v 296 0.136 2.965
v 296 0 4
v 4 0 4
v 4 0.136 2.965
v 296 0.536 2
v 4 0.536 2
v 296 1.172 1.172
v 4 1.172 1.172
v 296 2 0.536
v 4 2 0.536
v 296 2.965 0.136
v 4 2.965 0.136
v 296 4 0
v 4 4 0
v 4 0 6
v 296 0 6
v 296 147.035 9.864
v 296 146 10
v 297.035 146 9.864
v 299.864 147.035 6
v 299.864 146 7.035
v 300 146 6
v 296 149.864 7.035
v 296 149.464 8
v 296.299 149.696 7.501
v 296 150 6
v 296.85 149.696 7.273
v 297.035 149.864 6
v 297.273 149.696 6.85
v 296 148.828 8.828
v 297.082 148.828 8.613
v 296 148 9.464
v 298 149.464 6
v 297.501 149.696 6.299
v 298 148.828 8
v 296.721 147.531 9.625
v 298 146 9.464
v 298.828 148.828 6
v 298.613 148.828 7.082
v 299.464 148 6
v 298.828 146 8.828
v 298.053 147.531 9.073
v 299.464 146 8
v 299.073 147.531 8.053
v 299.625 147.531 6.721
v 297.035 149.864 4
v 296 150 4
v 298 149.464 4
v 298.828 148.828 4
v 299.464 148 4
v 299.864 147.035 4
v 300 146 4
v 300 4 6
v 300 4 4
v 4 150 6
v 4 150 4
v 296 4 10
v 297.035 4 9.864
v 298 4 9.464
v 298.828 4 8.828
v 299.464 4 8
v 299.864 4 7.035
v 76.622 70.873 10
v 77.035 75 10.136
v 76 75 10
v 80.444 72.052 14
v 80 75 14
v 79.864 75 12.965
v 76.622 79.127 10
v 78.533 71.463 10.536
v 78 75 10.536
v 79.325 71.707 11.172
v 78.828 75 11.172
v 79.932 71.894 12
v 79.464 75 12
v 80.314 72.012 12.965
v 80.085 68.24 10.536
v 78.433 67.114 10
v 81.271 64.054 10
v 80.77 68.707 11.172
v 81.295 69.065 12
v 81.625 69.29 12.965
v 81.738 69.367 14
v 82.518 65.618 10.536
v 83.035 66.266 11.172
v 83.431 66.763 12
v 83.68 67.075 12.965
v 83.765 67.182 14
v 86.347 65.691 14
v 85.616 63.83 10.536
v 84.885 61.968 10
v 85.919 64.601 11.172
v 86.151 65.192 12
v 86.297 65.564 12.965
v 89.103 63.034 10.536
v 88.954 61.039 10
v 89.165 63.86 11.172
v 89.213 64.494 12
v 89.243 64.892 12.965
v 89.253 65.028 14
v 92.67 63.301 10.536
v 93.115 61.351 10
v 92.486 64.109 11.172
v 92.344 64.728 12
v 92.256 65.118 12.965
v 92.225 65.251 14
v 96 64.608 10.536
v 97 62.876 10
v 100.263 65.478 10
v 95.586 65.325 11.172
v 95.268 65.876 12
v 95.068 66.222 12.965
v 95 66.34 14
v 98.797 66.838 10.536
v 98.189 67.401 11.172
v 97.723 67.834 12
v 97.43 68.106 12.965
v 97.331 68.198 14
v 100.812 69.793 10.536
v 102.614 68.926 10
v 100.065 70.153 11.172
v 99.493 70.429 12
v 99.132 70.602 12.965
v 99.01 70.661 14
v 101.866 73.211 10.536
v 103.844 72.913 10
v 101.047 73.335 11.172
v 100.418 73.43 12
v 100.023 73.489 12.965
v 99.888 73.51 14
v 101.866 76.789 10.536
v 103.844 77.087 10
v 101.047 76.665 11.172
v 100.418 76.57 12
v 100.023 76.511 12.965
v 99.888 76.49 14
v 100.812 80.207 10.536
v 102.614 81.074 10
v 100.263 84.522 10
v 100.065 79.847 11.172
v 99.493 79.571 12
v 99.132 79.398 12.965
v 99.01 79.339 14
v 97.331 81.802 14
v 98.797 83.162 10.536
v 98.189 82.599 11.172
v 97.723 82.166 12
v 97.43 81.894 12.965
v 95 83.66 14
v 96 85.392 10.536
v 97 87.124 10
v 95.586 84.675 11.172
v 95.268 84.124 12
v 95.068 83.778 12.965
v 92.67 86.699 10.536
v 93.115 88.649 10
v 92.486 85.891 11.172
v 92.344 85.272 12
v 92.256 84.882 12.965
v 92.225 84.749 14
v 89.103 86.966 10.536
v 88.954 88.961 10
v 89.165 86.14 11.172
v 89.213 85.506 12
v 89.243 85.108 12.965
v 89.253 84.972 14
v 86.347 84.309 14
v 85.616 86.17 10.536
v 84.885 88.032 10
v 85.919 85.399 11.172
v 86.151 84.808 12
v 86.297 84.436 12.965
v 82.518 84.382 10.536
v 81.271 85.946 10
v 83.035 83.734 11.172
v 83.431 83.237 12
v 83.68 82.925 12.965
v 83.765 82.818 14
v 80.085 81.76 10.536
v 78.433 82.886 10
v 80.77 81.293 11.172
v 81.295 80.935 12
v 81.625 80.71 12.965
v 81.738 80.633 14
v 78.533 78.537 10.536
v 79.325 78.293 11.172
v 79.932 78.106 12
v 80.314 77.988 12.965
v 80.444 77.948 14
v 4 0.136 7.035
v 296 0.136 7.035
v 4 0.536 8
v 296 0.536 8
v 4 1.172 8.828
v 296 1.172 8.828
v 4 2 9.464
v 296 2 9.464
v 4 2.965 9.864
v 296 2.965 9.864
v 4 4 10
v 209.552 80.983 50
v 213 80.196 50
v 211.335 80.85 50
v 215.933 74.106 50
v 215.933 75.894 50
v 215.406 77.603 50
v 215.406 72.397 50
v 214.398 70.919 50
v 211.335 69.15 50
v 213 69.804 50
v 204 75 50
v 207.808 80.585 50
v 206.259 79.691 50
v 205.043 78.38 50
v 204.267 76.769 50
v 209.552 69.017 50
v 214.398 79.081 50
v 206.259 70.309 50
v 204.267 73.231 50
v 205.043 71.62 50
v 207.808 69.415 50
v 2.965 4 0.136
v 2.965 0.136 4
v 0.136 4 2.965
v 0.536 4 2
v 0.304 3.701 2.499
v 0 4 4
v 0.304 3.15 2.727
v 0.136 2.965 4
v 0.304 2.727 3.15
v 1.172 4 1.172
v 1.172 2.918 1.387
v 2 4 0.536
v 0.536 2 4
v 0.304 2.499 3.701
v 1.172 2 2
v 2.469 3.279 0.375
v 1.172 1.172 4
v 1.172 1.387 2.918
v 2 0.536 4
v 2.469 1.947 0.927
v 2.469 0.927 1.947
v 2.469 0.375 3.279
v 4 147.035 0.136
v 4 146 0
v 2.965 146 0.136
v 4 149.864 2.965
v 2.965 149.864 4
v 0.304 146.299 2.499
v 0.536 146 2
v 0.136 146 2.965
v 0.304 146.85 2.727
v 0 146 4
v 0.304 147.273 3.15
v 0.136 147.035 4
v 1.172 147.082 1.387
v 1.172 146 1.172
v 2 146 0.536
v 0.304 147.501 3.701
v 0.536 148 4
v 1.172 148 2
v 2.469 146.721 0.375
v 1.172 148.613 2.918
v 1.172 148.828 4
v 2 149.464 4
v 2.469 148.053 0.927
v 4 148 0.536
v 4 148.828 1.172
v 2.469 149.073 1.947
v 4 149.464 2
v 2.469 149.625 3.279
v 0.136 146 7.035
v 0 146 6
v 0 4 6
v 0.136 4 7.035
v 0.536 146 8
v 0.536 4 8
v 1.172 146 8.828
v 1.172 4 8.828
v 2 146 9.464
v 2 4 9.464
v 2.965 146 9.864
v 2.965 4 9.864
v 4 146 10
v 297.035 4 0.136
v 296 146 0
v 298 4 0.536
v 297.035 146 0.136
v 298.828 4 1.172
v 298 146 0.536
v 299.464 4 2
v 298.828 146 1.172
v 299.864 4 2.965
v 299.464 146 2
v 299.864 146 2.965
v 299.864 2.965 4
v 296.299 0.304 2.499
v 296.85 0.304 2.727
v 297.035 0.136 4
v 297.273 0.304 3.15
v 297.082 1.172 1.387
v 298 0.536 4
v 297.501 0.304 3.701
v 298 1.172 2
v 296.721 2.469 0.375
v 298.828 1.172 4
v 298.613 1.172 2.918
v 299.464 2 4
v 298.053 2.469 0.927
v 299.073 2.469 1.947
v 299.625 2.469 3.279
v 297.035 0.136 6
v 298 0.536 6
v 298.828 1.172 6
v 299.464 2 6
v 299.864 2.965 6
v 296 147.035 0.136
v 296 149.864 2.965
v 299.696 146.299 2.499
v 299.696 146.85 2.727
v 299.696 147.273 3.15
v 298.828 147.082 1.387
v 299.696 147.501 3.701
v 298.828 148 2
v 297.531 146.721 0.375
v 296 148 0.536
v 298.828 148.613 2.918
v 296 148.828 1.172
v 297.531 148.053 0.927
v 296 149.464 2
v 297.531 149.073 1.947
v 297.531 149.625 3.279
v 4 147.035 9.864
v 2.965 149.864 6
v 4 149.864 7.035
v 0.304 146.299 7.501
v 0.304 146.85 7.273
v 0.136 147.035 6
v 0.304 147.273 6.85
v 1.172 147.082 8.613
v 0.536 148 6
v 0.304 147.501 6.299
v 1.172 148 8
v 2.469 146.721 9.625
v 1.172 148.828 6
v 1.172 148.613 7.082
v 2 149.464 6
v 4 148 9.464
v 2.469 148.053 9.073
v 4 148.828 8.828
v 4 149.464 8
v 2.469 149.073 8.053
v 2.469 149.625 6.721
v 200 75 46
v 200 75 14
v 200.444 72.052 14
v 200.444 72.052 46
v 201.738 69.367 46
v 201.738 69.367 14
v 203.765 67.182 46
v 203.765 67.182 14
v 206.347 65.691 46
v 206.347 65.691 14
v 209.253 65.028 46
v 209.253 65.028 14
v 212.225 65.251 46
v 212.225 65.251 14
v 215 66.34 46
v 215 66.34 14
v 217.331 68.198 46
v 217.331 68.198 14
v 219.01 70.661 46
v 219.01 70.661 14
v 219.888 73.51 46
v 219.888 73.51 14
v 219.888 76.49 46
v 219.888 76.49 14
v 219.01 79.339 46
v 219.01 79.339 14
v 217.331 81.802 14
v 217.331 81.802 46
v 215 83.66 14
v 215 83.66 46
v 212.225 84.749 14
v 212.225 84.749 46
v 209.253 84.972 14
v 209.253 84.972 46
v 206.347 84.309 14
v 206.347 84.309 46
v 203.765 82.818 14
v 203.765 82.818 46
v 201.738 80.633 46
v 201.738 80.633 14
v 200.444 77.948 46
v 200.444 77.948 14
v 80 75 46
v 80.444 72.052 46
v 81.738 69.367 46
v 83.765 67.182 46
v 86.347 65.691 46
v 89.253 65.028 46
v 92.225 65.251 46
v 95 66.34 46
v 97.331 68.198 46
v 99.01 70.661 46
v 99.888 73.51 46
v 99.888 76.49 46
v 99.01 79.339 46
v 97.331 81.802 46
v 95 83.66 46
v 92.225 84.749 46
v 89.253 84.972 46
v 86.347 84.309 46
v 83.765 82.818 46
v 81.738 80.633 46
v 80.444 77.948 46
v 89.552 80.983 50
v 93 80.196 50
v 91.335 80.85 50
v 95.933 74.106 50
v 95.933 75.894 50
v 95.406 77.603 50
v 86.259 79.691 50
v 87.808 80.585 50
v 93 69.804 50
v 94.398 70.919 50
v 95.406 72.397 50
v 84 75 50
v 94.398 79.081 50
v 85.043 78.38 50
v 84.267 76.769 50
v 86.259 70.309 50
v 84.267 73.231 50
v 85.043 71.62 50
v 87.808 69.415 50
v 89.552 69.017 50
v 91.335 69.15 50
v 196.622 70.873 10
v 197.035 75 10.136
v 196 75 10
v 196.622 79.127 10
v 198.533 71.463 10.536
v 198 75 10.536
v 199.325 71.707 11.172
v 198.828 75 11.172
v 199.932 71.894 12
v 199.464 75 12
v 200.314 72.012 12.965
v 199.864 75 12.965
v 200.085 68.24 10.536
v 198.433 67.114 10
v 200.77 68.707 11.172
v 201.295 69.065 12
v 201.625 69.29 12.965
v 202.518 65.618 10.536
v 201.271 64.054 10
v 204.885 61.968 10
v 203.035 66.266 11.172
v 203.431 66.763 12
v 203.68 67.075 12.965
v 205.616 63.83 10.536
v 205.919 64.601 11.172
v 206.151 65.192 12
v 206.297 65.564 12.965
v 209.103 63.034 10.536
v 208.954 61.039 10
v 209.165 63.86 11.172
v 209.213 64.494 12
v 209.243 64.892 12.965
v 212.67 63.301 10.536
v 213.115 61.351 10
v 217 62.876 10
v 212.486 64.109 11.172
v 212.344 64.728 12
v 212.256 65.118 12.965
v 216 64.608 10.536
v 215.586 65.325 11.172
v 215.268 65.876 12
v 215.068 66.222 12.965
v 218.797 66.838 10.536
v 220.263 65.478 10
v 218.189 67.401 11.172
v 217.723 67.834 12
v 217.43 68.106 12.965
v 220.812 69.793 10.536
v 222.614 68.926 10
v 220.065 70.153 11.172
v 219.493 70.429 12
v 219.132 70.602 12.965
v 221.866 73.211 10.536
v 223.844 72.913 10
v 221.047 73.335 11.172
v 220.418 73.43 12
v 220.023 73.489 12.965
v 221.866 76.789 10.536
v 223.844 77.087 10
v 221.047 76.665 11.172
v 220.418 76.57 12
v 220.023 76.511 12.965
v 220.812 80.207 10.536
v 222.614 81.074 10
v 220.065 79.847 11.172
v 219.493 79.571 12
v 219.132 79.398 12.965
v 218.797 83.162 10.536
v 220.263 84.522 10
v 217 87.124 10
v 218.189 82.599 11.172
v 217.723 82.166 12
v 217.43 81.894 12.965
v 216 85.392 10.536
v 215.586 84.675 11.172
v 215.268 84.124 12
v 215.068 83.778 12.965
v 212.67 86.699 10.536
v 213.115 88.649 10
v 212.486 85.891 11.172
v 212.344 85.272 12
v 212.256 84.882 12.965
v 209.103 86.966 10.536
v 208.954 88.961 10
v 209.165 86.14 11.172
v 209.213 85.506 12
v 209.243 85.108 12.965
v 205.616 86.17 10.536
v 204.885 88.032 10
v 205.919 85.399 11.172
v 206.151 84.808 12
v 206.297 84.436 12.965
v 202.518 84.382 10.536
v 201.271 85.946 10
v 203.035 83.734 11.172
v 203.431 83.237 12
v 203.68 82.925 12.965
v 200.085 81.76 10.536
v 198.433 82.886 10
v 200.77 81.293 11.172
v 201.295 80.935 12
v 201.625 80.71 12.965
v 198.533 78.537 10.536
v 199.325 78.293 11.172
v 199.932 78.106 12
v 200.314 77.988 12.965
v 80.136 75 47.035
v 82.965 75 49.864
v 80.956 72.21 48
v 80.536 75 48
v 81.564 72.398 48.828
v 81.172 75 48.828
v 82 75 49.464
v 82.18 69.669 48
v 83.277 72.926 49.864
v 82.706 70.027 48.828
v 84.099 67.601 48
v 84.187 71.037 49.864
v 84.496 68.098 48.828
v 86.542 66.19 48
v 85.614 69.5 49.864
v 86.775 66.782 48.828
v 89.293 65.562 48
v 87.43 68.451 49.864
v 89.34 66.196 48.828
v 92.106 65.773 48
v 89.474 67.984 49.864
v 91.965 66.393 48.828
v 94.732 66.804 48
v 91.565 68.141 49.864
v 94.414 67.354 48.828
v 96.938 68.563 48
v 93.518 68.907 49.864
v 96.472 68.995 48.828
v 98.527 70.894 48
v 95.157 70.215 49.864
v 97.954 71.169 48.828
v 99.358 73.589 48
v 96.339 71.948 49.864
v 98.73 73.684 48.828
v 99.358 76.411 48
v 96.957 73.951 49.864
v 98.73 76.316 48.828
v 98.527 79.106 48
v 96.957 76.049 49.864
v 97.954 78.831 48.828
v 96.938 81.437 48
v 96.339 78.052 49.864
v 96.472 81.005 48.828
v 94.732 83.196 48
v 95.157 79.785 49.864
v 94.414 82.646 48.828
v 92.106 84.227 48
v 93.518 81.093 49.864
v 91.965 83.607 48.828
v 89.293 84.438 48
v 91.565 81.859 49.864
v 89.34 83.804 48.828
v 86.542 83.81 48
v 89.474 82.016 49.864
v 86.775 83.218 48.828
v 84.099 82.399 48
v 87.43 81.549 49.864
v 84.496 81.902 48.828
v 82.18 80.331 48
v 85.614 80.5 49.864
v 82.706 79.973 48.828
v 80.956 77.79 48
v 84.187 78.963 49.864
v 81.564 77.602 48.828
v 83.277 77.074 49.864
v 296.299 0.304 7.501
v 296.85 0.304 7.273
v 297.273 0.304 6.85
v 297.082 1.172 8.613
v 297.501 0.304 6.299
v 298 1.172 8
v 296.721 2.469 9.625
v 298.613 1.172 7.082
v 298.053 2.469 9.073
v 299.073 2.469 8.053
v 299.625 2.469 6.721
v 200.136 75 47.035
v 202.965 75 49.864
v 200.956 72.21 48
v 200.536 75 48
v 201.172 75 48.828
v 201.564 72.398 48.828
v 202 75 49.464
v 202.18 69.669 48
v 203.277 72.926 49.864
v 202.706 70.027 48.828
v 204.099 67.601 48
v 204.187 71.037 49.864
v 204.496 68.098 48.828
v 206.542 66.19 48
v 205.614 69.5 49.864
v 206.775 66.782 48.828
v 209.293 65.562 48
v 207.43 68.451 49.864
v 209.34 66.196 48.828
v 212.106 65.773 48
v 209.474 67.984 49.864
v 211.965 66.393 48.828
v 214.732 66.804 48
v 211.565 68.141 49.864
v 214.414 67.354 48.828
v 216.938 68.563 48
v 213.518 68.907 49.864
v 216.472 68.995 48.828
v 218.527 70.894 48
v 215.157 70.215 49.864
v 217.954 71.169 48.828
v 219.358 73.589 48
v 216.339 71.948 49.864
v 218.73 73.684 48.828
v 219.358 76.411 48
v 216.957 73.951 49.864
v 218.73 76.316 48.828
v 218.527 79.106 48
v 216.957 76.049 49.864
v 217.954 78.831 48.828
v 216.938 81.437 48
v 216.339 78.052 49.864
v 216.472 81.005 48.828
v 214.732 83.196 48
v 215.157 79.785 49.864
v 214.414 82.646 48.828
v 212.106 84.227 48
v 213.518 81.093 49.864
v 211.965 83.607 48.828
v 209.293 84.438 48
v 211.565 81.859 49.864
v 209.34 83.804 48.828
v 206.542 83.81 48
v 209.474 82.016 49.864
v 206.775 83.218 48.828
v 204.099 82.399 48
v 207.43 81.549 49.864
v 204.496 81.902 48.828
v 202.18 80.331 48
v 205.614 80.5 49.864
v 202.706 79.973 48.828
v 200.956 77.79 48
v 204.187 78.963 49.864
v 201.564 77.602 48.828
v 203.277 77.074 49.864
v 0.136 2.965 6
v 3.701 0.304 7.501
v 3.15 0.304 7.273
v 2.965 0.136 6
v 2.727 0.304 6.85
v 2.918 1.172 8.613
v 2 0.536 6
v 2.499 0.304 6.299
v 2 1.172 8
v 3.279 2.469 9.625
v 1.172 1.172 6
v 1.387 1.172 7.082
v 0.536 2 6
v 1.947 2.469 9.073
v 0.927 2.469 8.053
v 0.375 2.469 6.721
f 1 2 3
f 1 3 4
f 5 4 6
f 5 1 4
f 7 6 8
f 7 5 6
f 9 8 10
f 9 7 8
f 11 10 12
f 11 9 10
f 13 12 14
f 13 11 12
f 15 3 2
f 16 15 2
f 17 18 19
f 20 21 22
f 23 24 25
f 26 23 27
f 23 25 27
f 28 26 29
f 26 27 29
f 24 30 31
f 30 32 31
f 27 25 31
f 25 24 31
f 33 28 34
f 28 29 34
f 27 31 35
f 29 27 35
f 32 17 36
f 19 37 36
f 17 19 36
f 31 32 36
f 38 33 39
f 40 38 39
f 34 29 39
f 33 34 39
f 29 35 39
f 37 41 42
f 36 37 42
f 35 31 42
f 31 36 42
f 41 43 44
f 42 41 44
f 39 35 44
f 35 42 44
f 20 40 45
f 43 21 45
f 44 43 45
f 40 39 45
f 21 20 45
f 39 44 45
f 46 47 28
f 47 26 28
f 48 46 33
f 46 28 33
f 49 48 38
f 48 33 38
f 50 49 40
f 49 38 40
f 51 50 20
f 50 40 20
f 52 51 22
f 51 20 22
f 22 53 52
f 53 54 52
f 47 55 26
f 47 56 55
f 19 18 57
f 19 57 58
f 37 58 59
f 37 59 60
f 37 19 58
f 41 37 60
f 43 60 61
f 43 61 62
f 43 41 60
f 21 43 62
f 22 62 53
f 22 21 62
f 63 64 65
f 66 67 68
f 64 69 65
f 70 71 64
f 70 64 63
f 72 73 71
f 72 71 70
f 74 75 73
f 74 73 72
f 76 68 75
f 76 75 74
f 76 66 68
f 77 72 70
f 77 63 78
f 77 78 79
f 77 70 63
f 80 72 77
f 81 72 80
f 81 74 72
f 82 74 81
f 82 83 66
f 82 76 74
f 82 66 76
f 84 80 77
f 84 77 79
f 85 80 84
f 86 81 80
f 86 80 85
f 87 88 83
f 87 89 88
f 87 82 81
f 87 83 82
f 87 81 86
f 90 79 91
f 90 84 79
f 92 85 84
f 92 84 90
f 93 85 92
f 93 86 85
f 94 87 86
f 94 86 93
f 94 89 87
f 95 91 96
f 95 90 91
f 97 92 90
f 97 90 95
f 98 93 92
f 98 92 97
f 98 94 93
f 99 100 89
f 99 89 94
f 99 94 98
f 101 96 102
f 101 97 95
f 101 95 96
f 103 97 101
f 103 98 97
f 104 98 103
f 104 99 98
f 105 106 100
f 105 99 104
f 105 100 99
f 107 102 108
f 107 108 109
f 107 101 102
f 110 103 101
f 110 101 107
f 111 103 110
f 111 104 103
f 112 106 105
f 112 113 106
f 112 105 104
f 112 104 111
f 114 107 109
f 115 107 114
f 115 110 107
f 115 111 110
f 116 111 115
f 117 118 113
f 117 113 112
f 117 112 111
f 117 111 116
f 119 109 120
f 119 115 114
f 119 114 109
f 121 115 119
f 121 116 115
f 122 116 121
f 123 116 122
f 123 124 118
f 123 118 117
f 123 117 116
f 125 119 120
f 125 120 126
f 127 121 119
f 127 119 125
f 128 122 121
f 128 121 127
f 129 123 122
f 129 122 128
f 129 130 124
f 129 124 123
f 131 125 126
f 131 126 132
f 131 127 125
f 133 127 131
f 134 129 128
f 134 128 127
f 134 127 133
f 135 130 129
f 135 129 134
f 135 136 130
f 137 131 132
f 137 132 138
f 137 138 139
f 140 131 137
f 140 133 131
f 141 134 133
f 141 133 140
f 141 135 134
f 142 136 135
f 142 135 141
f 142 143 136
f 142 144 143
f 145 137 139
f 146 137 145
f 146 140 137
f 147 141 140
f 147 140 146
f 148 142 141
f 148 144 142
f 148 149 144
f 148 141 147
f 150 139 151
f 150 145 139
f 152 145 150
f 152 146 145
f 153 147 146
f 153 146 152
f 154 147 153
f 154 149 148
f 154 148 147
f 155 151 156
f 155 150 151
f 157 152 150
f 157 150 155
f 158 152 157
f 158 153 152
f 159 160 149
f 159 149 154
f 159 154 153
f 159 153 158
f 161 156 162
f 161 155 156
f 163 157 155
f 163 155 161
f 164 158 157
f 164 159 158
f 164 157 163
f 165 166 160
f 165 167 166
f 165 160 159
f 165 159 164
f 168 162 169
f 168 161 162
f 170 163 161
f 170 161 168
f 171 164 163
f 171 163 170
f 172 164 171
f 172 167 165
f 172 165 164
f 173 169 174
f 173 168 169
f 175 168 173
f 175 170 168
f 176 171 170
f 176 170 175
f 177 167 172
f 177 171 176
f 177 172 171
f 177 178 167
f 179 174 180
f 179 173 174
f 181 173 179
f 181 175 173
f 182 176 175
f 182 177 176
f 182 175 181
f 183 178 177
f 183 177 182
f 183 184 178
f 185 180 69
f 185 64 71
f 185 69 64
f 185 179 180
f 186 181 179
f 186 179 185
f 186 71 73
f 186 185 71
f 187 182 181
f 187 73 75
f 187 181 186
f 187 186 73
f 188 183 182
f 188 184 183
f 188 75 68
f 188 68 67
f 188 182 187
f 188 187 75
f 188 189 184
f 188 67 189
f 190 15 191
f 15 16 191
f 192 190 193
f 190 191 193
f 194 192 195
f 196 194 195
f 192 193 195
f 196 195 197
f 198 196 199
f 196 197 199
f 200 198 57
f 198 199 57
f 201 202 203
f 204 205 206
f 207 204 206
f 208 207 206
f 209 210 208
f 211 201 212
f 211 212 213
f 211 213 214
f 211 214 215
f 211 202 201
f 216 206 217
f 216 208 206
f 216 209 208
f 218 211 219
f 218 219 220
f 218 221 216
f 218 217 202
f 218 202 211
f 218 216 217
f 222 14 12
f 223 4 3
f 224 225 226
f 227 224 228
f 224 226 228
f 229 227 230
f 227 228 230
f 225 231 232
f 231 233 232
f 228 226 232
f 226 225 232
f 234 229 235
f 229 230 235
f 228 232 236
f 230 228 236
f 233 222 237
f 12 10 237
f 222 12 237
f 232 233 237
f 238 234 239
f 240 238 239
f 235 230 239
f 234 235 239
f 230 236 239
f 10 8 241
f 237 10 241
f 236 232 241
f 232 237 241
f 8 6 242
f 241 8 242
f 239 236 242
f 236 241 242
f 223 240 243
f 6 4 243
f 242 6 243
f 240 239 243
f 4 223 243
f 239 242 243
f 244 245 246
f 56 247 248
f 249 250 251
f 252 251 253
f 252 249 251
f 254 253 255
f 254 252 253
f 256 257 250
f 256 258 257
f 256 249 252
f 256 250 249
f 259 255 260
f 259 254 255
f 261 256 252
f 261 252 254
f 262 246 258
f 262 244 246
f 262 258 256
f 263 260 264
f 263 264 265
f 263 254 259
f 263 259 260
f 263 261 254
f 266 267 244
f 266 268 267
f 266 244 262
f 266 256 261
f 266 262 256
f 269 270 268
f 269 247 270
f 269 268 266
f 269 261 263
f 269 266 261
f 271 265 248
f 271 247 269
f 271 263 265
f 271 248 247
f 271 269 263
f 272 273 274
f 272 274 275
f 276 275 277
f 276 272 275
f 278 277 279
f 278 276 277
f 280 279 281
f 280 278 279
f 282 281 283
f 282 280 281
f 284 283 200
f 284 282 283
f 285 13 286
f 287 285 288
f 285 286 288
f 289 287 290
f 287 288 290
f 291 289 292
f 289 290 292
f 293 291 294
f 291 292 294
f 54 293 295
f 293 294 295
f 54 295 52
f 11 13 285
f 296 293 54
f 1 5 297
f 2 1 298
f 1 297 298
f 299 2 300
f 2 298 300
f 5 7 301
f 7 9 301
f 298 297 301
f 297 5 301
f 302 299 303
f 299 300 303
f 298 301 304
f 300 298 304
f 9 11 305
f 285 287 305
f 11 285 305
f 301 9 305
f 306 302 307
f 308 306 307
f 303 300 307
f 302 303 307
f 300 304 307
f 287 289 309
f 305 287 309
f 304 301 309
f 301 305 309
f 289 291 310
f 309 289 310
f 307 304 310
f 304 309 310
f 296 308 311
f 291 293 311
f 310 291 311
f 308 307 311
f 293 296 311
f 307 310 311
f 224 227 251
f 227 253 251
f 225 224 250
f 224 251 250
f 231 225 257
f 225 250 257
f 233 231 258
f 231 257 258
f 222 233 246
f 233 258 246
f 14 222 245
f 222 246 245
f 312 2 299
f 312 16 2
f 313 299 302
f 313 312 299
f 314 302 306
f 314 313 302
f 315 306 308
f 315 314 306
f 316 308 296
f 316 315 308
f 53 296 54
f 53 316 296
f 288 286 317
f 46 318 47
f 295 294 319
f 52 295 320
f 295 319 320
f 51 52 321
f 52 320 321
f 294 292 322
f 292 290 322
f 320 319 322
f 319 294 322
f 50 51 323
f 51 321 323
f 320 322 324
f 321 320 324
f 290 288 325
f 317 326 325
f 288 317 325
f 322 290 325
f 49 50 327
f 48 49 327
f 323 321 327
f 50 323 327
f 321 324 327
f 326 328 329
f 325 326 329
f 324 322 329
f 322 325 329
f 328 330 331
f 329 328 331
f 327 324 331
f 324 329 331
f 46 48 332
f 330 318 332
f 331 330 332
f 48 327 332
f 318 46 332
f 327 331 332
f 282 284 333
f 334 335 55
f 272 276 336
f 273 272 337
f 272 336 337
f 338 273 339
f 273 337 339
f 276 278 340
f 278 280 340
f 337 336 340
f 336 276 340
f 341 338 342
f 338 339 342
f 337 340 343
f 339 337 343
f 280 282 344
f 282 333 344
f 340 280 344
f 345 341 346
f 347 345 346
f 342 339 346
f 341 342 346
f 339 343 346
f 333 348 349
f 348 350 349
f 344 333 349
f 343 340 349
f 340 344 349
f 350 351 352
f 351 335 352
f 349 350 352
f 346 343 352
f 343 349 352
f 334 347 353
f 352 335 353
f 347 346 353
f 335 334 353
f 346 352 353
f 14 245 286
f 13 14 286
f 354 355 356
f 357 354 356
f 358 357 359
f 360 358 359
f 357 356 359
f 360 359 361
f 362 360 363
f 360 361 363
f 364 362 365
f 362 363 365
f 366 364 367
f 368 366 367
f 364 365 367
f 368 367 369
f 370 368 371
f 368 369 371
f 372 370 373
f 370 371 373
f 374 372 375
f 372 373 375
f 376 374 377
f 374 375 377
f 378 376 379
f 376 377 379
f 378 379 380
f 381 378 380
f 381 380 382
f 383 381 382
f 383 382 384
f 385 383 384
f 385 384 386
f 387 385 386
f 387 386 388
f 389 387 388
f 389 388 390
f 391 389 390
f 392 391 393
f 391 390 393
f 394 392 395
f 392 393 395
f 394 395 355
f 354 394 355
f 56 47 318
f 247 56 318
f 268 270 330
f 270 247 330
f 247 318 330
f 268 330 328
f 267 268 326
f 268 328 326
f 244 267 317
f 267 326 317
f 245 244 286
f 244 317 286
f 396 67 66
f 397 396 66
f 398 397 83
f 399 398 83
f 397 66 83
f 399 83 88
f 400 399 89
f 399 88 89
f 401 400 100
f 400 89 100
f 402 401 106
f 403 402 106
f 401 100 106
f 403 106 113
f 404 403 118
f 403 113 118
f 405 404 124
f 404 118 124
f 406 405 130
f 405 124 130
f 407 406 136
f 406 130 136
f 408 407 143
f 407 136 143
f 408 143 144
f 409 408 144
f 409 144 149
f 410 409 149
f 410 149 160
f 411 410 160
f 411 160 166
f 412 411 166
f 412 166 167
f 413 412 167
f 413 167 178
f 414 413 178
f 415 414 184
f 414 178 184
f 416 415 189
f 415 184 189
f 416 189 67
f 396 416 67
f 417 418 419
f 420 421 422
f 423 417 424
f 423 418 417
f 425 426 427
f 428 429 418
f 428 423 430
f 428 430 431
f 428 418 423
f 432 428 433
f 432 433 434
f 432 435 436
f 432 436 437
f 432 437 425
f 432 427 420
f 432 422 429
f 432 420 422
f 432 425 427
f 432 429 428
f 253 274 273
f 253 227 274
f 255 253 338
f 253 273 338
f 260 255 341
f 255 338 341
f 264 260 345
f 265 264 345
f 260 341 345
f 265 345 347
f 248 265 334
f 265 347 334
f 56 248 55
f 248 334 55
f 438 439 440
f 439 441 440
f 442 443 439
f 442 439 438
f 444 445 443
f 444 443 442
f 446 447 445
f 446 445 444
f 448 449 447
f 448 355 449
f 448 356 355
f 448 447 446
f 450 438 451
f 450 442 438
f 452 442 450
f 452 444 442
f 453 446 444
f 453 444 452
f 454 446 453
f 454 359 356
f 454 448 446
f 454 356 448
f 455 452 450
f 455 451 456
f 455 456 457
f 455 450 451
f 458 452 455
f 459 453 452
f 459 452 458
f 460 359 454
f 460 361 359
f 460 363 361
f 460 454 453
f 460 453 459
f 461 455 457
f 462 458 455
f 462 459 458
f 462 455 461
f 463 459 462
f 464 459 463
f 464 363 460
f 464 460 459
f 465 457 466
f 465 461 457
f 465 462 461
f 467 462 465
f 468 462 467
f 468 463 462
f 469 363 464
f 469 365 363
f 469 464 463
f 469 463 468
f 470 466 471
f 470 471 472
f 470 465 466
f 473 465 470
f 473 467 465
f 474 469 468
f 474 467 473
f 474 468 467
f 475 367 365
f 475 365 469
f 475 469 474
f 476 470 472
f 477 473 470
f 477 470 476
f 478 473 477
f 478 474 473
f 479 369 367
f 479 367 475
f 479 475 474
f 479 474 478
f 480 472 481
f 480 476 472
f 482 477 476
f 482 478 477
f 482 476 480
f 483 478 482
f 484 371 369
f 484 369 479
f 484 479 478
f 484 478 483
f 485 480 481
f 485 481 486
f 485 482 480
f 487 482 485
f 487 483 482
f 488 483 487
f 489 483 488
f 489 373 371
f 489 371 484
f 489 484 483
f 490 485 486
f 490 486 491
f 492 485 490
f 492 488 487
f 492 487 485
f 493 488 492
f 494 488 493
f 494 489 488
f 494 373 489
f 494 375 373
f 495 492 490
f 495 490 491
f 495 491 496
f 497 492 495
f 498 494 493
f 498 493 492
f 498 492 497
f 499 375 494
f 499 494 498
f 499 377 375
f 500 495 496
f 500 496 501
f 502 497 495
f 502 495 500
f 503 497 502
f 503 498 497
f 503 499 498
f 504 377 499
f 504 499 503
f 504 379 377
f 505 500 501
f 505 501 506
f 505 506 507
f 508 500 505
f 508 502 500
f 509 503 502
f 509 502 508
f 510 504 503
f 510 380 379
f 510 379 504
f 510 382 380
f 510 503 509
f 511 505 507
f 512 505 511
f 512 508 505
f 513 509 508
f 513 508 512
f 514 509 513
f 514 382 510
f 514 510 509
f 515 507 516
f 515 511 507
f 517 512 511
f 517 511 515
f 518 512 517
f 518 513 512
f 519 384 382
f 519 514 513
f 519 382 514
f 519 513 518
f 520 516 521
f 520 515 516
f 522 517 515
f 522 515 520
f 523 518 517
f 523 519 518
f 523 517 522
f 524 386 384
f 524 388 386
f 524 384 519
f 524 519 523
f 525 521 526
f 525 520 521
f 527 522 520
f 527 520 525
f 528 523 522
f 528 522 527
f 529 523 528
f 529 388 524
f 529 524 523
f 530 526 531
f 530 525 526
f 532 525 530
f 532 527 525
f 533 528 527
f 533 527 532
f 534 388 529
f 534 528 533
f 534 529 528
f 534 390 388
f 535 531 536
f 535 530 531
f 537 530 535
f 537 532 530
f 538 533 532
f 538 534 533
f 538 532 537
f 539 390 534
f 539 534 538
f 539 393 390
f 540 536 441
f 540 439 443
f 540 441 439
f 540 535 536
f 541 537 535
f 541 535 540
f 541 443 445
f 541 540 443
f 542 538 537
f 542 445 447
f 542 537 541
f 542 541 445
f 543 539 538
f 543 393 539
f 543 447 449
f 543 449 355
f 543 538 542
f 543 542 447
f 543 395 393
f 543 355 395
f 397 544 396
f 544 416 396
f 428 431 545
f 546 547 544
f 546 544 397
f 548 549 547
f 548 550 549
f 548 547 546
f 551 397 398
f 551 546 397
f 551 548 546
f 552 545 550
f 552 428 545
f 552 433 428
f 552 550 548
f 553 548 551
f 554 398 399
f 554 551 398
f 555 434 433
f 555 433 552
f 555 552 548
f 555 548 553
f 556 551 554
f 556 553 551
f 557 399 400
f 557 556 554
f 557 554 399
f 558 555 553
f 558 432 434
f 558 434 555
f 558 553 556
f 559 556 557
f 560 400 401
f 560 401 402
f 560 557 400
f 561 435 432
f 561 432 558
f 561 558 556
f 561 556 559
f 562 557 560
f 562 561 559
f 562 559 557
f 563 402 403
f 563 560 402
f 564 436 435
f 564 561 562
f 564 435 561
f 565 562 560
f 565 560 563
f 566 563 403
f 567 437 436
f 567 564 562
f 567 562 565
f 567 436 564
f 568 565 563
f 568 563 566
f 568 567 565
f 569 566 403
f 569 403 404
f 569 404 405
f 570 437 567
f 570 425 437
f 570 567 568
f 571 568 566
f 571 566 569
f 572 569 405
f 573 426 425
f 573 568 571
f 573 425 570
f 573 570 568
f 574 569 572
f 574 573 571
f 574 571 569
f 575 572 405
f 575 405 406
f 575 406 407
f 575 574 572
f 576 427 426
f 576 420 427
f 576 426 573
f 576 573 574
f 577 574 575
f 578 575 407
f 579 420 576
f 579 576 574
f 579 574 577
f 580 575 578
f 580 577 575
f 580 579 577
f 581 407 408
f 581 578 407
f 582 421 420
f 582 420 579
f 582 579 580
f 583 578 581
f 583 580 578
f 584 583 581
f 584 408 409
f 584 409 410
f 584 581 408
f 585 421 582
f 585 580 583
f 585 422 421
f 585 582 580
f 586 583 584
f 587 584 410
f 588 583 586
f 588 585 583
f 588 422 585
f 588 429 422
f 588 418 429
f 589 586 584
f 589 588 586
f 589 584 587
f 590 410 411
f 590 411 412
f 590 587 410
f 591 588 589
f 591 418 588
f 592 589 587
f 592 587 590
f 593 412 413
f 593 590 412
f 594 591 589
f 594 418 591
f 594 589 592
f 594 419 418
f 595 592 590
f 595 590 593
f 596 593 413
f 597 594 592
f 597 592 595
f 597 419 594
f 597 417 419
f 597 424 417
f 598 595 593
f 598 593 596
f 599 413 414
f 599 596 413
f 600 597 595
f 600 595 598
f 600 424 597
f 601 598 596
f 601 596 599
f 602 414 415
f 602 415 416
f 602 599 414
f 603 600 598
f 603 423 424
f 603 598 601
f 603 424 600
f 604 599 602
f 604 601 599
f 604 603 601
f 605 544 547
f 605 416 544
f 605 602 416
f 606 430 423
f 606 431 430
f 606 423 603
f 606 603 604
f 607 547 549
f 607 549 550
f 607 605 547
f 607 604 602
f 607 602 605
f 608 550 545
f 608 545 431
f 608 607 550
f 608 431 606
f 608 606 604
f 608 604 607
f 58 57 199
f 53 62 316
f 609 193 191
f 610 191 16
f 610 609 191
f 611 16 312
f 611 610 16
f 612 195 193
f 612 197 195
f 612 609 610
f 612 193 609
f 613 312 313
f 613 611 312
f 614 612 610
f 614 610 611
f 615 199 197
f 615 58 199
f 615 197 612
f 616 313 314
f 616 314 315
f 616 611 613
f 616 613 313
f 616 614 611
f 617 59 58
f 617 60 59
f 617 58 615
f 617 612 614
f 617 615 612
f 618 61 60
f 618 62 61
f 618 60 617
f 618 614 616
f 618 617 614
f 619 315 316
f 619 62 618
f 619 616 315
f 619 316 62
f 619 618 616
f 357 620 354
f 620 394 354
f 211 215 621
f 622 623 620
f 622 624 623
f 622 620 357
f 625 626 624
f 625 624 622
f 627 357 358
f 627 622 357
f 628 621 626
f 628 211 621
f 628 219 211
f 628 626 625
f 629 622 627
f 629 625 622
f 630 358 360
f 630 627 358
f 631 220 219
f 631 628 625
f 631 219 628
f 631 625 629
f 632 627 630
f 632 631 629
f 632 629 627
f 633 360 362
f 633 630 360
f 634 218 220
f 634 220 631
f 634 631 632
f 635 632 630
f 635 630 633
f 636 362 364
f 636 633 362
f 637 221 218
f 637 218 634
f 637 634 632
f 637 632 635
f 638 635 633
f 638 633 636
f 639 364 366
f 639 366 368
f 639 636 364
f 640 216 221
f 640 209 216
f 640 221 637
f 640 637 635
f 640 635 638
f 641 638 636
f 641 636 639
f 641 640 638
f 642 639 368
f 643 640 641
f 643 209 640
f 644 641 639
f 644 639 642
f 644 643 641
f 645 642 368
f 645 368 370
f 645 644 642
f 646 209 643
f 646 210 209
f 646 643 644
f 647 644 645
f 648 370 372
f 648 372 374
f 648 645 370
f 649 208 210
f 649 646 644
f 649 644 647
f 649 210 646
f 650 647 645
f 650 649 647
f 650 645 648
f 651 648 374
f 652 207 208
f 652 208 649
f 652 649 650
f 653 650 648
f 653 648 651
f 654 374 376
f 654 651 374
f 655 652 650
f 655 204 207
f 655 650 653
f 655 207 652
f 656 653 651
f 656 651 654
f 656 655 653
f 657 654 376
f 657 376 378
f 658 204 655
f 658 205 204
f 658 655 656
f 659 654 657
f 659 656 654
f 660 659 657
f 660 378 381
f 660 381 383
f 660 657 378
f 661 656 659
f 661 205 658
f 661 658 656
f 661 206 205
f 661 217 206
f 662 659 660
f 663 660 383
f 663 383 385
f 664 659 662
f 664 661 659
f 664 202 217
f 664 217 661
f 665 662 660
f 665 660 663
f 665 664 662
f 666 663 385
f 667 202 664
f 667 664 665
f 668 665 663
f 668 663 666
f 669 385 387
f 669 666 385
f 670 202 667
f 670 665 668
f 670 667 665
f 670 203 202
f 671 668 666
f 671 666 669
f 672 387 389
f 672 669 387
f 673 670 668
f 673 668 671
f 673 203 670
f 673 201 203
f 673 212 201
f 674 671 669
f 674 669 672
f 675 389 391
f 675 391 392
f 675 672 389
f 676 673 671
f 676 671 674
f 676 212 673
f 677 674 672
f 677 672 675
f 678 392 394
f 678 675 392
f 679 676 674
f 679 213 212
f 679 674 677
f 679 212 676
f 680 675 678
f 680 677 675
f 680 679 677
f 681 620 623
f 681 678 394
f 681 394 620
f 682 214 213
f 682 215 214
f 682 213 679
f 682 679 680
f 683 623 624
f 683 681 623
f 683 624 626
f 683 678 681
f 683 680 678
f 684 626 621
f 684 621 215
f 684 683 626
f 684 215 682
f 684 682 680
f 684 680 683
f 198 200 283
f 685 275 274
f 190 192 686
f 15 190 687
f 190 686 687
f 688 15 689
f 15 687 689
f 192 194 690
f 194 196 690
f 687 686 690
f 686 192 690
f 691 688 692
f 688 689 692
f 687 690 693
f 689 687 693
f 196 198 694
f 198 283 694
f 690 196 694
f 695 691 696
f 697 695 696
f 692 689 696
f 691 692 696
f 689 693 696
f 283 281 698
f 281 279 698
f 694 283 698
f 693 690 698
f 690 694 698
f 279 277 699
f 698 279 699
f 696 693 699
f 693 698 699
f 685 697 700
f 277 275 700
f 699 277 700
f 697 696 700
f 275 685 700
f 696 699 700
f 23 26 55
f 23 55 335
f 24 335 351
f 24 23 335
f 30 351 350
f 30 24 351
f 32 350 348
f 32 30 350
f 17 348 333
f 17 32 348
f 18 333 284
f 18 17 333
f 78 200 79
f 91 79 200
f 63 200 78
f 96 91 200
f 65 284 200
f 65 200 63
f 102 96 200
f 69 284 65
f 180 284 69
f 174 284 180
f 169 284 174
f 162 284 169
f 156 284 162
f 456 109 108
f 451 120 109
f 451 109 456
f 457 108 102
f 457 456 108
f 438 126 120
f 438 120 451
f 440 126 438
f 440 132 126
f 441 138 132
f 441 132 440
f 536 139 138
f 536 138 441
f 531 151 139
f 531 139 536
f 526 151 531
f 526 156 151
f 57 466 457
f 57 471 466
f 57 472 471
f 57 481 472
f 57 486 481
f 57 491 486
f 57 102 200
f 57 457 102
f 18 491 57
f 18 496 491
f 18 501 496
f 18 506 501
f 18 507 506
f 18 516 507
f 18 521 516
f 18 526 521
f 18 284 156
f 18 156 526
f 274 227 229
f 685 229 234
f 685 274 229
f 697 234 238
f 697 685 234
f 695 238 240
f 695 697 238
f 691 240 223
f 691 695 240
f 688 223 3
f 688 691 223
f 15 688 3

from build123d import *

# Parameters (mm, degrees)
SKETCH_1_W      = 300
SKETCH_1_H      = 150
EXTRUDE_1_DEPTH = 10
SKETCH_2_R      = 10
EXTRUDE_2_DEPTH = 40
FILLET_1_R      = 4


with BuildPart() as part:
    # 草圖1 → 填料-伸長1 (new body)
    with BuildSketch(Plane.XY):
        with Locations((150, 75)):
            Rectangle(SKETCH_1_W, SKETCH_1_H)
    extrude(amount=EXTRUDE_1_DEPTH)

    # 草圖2 → 填料-伸長2 (add)
    with BuildSketch(Plane.XY.offset(10)):
        with Locations(Location((90, 75, 0), (0, 0, 180))):
            Circle(SKETCH_2_R)
        with Locations(Location((210, 75, 0), (0, 0, 180))):
            Circle(SKETCH_2_R)
    extrude(amount=EXTRUDE_2_DEPTH)

    # 圓角1
    fillet_1_edges = [part.edges().sort_by_distance(p)[0] for p in [
        (300, 75, 10),
        (150, 150, 10),
        (100, 75, 10),
        (100, 75, 50),
        (220, 75, 10),
        (220, 75, 50),
        (0, 75, 10),
        (150, 150, 0),
        (300, 75, 0),
        (150, 0, 0),
        (0, 75, 0),
        (150, 0, 10),
        (0, 150, 5),
        (300, 150, 5),
        (300, 0, 5),
        (0, 0, 5),
    ]]
    fillet(fillet_1_edges, radius=FILLET_1_R)


solid = part.part
